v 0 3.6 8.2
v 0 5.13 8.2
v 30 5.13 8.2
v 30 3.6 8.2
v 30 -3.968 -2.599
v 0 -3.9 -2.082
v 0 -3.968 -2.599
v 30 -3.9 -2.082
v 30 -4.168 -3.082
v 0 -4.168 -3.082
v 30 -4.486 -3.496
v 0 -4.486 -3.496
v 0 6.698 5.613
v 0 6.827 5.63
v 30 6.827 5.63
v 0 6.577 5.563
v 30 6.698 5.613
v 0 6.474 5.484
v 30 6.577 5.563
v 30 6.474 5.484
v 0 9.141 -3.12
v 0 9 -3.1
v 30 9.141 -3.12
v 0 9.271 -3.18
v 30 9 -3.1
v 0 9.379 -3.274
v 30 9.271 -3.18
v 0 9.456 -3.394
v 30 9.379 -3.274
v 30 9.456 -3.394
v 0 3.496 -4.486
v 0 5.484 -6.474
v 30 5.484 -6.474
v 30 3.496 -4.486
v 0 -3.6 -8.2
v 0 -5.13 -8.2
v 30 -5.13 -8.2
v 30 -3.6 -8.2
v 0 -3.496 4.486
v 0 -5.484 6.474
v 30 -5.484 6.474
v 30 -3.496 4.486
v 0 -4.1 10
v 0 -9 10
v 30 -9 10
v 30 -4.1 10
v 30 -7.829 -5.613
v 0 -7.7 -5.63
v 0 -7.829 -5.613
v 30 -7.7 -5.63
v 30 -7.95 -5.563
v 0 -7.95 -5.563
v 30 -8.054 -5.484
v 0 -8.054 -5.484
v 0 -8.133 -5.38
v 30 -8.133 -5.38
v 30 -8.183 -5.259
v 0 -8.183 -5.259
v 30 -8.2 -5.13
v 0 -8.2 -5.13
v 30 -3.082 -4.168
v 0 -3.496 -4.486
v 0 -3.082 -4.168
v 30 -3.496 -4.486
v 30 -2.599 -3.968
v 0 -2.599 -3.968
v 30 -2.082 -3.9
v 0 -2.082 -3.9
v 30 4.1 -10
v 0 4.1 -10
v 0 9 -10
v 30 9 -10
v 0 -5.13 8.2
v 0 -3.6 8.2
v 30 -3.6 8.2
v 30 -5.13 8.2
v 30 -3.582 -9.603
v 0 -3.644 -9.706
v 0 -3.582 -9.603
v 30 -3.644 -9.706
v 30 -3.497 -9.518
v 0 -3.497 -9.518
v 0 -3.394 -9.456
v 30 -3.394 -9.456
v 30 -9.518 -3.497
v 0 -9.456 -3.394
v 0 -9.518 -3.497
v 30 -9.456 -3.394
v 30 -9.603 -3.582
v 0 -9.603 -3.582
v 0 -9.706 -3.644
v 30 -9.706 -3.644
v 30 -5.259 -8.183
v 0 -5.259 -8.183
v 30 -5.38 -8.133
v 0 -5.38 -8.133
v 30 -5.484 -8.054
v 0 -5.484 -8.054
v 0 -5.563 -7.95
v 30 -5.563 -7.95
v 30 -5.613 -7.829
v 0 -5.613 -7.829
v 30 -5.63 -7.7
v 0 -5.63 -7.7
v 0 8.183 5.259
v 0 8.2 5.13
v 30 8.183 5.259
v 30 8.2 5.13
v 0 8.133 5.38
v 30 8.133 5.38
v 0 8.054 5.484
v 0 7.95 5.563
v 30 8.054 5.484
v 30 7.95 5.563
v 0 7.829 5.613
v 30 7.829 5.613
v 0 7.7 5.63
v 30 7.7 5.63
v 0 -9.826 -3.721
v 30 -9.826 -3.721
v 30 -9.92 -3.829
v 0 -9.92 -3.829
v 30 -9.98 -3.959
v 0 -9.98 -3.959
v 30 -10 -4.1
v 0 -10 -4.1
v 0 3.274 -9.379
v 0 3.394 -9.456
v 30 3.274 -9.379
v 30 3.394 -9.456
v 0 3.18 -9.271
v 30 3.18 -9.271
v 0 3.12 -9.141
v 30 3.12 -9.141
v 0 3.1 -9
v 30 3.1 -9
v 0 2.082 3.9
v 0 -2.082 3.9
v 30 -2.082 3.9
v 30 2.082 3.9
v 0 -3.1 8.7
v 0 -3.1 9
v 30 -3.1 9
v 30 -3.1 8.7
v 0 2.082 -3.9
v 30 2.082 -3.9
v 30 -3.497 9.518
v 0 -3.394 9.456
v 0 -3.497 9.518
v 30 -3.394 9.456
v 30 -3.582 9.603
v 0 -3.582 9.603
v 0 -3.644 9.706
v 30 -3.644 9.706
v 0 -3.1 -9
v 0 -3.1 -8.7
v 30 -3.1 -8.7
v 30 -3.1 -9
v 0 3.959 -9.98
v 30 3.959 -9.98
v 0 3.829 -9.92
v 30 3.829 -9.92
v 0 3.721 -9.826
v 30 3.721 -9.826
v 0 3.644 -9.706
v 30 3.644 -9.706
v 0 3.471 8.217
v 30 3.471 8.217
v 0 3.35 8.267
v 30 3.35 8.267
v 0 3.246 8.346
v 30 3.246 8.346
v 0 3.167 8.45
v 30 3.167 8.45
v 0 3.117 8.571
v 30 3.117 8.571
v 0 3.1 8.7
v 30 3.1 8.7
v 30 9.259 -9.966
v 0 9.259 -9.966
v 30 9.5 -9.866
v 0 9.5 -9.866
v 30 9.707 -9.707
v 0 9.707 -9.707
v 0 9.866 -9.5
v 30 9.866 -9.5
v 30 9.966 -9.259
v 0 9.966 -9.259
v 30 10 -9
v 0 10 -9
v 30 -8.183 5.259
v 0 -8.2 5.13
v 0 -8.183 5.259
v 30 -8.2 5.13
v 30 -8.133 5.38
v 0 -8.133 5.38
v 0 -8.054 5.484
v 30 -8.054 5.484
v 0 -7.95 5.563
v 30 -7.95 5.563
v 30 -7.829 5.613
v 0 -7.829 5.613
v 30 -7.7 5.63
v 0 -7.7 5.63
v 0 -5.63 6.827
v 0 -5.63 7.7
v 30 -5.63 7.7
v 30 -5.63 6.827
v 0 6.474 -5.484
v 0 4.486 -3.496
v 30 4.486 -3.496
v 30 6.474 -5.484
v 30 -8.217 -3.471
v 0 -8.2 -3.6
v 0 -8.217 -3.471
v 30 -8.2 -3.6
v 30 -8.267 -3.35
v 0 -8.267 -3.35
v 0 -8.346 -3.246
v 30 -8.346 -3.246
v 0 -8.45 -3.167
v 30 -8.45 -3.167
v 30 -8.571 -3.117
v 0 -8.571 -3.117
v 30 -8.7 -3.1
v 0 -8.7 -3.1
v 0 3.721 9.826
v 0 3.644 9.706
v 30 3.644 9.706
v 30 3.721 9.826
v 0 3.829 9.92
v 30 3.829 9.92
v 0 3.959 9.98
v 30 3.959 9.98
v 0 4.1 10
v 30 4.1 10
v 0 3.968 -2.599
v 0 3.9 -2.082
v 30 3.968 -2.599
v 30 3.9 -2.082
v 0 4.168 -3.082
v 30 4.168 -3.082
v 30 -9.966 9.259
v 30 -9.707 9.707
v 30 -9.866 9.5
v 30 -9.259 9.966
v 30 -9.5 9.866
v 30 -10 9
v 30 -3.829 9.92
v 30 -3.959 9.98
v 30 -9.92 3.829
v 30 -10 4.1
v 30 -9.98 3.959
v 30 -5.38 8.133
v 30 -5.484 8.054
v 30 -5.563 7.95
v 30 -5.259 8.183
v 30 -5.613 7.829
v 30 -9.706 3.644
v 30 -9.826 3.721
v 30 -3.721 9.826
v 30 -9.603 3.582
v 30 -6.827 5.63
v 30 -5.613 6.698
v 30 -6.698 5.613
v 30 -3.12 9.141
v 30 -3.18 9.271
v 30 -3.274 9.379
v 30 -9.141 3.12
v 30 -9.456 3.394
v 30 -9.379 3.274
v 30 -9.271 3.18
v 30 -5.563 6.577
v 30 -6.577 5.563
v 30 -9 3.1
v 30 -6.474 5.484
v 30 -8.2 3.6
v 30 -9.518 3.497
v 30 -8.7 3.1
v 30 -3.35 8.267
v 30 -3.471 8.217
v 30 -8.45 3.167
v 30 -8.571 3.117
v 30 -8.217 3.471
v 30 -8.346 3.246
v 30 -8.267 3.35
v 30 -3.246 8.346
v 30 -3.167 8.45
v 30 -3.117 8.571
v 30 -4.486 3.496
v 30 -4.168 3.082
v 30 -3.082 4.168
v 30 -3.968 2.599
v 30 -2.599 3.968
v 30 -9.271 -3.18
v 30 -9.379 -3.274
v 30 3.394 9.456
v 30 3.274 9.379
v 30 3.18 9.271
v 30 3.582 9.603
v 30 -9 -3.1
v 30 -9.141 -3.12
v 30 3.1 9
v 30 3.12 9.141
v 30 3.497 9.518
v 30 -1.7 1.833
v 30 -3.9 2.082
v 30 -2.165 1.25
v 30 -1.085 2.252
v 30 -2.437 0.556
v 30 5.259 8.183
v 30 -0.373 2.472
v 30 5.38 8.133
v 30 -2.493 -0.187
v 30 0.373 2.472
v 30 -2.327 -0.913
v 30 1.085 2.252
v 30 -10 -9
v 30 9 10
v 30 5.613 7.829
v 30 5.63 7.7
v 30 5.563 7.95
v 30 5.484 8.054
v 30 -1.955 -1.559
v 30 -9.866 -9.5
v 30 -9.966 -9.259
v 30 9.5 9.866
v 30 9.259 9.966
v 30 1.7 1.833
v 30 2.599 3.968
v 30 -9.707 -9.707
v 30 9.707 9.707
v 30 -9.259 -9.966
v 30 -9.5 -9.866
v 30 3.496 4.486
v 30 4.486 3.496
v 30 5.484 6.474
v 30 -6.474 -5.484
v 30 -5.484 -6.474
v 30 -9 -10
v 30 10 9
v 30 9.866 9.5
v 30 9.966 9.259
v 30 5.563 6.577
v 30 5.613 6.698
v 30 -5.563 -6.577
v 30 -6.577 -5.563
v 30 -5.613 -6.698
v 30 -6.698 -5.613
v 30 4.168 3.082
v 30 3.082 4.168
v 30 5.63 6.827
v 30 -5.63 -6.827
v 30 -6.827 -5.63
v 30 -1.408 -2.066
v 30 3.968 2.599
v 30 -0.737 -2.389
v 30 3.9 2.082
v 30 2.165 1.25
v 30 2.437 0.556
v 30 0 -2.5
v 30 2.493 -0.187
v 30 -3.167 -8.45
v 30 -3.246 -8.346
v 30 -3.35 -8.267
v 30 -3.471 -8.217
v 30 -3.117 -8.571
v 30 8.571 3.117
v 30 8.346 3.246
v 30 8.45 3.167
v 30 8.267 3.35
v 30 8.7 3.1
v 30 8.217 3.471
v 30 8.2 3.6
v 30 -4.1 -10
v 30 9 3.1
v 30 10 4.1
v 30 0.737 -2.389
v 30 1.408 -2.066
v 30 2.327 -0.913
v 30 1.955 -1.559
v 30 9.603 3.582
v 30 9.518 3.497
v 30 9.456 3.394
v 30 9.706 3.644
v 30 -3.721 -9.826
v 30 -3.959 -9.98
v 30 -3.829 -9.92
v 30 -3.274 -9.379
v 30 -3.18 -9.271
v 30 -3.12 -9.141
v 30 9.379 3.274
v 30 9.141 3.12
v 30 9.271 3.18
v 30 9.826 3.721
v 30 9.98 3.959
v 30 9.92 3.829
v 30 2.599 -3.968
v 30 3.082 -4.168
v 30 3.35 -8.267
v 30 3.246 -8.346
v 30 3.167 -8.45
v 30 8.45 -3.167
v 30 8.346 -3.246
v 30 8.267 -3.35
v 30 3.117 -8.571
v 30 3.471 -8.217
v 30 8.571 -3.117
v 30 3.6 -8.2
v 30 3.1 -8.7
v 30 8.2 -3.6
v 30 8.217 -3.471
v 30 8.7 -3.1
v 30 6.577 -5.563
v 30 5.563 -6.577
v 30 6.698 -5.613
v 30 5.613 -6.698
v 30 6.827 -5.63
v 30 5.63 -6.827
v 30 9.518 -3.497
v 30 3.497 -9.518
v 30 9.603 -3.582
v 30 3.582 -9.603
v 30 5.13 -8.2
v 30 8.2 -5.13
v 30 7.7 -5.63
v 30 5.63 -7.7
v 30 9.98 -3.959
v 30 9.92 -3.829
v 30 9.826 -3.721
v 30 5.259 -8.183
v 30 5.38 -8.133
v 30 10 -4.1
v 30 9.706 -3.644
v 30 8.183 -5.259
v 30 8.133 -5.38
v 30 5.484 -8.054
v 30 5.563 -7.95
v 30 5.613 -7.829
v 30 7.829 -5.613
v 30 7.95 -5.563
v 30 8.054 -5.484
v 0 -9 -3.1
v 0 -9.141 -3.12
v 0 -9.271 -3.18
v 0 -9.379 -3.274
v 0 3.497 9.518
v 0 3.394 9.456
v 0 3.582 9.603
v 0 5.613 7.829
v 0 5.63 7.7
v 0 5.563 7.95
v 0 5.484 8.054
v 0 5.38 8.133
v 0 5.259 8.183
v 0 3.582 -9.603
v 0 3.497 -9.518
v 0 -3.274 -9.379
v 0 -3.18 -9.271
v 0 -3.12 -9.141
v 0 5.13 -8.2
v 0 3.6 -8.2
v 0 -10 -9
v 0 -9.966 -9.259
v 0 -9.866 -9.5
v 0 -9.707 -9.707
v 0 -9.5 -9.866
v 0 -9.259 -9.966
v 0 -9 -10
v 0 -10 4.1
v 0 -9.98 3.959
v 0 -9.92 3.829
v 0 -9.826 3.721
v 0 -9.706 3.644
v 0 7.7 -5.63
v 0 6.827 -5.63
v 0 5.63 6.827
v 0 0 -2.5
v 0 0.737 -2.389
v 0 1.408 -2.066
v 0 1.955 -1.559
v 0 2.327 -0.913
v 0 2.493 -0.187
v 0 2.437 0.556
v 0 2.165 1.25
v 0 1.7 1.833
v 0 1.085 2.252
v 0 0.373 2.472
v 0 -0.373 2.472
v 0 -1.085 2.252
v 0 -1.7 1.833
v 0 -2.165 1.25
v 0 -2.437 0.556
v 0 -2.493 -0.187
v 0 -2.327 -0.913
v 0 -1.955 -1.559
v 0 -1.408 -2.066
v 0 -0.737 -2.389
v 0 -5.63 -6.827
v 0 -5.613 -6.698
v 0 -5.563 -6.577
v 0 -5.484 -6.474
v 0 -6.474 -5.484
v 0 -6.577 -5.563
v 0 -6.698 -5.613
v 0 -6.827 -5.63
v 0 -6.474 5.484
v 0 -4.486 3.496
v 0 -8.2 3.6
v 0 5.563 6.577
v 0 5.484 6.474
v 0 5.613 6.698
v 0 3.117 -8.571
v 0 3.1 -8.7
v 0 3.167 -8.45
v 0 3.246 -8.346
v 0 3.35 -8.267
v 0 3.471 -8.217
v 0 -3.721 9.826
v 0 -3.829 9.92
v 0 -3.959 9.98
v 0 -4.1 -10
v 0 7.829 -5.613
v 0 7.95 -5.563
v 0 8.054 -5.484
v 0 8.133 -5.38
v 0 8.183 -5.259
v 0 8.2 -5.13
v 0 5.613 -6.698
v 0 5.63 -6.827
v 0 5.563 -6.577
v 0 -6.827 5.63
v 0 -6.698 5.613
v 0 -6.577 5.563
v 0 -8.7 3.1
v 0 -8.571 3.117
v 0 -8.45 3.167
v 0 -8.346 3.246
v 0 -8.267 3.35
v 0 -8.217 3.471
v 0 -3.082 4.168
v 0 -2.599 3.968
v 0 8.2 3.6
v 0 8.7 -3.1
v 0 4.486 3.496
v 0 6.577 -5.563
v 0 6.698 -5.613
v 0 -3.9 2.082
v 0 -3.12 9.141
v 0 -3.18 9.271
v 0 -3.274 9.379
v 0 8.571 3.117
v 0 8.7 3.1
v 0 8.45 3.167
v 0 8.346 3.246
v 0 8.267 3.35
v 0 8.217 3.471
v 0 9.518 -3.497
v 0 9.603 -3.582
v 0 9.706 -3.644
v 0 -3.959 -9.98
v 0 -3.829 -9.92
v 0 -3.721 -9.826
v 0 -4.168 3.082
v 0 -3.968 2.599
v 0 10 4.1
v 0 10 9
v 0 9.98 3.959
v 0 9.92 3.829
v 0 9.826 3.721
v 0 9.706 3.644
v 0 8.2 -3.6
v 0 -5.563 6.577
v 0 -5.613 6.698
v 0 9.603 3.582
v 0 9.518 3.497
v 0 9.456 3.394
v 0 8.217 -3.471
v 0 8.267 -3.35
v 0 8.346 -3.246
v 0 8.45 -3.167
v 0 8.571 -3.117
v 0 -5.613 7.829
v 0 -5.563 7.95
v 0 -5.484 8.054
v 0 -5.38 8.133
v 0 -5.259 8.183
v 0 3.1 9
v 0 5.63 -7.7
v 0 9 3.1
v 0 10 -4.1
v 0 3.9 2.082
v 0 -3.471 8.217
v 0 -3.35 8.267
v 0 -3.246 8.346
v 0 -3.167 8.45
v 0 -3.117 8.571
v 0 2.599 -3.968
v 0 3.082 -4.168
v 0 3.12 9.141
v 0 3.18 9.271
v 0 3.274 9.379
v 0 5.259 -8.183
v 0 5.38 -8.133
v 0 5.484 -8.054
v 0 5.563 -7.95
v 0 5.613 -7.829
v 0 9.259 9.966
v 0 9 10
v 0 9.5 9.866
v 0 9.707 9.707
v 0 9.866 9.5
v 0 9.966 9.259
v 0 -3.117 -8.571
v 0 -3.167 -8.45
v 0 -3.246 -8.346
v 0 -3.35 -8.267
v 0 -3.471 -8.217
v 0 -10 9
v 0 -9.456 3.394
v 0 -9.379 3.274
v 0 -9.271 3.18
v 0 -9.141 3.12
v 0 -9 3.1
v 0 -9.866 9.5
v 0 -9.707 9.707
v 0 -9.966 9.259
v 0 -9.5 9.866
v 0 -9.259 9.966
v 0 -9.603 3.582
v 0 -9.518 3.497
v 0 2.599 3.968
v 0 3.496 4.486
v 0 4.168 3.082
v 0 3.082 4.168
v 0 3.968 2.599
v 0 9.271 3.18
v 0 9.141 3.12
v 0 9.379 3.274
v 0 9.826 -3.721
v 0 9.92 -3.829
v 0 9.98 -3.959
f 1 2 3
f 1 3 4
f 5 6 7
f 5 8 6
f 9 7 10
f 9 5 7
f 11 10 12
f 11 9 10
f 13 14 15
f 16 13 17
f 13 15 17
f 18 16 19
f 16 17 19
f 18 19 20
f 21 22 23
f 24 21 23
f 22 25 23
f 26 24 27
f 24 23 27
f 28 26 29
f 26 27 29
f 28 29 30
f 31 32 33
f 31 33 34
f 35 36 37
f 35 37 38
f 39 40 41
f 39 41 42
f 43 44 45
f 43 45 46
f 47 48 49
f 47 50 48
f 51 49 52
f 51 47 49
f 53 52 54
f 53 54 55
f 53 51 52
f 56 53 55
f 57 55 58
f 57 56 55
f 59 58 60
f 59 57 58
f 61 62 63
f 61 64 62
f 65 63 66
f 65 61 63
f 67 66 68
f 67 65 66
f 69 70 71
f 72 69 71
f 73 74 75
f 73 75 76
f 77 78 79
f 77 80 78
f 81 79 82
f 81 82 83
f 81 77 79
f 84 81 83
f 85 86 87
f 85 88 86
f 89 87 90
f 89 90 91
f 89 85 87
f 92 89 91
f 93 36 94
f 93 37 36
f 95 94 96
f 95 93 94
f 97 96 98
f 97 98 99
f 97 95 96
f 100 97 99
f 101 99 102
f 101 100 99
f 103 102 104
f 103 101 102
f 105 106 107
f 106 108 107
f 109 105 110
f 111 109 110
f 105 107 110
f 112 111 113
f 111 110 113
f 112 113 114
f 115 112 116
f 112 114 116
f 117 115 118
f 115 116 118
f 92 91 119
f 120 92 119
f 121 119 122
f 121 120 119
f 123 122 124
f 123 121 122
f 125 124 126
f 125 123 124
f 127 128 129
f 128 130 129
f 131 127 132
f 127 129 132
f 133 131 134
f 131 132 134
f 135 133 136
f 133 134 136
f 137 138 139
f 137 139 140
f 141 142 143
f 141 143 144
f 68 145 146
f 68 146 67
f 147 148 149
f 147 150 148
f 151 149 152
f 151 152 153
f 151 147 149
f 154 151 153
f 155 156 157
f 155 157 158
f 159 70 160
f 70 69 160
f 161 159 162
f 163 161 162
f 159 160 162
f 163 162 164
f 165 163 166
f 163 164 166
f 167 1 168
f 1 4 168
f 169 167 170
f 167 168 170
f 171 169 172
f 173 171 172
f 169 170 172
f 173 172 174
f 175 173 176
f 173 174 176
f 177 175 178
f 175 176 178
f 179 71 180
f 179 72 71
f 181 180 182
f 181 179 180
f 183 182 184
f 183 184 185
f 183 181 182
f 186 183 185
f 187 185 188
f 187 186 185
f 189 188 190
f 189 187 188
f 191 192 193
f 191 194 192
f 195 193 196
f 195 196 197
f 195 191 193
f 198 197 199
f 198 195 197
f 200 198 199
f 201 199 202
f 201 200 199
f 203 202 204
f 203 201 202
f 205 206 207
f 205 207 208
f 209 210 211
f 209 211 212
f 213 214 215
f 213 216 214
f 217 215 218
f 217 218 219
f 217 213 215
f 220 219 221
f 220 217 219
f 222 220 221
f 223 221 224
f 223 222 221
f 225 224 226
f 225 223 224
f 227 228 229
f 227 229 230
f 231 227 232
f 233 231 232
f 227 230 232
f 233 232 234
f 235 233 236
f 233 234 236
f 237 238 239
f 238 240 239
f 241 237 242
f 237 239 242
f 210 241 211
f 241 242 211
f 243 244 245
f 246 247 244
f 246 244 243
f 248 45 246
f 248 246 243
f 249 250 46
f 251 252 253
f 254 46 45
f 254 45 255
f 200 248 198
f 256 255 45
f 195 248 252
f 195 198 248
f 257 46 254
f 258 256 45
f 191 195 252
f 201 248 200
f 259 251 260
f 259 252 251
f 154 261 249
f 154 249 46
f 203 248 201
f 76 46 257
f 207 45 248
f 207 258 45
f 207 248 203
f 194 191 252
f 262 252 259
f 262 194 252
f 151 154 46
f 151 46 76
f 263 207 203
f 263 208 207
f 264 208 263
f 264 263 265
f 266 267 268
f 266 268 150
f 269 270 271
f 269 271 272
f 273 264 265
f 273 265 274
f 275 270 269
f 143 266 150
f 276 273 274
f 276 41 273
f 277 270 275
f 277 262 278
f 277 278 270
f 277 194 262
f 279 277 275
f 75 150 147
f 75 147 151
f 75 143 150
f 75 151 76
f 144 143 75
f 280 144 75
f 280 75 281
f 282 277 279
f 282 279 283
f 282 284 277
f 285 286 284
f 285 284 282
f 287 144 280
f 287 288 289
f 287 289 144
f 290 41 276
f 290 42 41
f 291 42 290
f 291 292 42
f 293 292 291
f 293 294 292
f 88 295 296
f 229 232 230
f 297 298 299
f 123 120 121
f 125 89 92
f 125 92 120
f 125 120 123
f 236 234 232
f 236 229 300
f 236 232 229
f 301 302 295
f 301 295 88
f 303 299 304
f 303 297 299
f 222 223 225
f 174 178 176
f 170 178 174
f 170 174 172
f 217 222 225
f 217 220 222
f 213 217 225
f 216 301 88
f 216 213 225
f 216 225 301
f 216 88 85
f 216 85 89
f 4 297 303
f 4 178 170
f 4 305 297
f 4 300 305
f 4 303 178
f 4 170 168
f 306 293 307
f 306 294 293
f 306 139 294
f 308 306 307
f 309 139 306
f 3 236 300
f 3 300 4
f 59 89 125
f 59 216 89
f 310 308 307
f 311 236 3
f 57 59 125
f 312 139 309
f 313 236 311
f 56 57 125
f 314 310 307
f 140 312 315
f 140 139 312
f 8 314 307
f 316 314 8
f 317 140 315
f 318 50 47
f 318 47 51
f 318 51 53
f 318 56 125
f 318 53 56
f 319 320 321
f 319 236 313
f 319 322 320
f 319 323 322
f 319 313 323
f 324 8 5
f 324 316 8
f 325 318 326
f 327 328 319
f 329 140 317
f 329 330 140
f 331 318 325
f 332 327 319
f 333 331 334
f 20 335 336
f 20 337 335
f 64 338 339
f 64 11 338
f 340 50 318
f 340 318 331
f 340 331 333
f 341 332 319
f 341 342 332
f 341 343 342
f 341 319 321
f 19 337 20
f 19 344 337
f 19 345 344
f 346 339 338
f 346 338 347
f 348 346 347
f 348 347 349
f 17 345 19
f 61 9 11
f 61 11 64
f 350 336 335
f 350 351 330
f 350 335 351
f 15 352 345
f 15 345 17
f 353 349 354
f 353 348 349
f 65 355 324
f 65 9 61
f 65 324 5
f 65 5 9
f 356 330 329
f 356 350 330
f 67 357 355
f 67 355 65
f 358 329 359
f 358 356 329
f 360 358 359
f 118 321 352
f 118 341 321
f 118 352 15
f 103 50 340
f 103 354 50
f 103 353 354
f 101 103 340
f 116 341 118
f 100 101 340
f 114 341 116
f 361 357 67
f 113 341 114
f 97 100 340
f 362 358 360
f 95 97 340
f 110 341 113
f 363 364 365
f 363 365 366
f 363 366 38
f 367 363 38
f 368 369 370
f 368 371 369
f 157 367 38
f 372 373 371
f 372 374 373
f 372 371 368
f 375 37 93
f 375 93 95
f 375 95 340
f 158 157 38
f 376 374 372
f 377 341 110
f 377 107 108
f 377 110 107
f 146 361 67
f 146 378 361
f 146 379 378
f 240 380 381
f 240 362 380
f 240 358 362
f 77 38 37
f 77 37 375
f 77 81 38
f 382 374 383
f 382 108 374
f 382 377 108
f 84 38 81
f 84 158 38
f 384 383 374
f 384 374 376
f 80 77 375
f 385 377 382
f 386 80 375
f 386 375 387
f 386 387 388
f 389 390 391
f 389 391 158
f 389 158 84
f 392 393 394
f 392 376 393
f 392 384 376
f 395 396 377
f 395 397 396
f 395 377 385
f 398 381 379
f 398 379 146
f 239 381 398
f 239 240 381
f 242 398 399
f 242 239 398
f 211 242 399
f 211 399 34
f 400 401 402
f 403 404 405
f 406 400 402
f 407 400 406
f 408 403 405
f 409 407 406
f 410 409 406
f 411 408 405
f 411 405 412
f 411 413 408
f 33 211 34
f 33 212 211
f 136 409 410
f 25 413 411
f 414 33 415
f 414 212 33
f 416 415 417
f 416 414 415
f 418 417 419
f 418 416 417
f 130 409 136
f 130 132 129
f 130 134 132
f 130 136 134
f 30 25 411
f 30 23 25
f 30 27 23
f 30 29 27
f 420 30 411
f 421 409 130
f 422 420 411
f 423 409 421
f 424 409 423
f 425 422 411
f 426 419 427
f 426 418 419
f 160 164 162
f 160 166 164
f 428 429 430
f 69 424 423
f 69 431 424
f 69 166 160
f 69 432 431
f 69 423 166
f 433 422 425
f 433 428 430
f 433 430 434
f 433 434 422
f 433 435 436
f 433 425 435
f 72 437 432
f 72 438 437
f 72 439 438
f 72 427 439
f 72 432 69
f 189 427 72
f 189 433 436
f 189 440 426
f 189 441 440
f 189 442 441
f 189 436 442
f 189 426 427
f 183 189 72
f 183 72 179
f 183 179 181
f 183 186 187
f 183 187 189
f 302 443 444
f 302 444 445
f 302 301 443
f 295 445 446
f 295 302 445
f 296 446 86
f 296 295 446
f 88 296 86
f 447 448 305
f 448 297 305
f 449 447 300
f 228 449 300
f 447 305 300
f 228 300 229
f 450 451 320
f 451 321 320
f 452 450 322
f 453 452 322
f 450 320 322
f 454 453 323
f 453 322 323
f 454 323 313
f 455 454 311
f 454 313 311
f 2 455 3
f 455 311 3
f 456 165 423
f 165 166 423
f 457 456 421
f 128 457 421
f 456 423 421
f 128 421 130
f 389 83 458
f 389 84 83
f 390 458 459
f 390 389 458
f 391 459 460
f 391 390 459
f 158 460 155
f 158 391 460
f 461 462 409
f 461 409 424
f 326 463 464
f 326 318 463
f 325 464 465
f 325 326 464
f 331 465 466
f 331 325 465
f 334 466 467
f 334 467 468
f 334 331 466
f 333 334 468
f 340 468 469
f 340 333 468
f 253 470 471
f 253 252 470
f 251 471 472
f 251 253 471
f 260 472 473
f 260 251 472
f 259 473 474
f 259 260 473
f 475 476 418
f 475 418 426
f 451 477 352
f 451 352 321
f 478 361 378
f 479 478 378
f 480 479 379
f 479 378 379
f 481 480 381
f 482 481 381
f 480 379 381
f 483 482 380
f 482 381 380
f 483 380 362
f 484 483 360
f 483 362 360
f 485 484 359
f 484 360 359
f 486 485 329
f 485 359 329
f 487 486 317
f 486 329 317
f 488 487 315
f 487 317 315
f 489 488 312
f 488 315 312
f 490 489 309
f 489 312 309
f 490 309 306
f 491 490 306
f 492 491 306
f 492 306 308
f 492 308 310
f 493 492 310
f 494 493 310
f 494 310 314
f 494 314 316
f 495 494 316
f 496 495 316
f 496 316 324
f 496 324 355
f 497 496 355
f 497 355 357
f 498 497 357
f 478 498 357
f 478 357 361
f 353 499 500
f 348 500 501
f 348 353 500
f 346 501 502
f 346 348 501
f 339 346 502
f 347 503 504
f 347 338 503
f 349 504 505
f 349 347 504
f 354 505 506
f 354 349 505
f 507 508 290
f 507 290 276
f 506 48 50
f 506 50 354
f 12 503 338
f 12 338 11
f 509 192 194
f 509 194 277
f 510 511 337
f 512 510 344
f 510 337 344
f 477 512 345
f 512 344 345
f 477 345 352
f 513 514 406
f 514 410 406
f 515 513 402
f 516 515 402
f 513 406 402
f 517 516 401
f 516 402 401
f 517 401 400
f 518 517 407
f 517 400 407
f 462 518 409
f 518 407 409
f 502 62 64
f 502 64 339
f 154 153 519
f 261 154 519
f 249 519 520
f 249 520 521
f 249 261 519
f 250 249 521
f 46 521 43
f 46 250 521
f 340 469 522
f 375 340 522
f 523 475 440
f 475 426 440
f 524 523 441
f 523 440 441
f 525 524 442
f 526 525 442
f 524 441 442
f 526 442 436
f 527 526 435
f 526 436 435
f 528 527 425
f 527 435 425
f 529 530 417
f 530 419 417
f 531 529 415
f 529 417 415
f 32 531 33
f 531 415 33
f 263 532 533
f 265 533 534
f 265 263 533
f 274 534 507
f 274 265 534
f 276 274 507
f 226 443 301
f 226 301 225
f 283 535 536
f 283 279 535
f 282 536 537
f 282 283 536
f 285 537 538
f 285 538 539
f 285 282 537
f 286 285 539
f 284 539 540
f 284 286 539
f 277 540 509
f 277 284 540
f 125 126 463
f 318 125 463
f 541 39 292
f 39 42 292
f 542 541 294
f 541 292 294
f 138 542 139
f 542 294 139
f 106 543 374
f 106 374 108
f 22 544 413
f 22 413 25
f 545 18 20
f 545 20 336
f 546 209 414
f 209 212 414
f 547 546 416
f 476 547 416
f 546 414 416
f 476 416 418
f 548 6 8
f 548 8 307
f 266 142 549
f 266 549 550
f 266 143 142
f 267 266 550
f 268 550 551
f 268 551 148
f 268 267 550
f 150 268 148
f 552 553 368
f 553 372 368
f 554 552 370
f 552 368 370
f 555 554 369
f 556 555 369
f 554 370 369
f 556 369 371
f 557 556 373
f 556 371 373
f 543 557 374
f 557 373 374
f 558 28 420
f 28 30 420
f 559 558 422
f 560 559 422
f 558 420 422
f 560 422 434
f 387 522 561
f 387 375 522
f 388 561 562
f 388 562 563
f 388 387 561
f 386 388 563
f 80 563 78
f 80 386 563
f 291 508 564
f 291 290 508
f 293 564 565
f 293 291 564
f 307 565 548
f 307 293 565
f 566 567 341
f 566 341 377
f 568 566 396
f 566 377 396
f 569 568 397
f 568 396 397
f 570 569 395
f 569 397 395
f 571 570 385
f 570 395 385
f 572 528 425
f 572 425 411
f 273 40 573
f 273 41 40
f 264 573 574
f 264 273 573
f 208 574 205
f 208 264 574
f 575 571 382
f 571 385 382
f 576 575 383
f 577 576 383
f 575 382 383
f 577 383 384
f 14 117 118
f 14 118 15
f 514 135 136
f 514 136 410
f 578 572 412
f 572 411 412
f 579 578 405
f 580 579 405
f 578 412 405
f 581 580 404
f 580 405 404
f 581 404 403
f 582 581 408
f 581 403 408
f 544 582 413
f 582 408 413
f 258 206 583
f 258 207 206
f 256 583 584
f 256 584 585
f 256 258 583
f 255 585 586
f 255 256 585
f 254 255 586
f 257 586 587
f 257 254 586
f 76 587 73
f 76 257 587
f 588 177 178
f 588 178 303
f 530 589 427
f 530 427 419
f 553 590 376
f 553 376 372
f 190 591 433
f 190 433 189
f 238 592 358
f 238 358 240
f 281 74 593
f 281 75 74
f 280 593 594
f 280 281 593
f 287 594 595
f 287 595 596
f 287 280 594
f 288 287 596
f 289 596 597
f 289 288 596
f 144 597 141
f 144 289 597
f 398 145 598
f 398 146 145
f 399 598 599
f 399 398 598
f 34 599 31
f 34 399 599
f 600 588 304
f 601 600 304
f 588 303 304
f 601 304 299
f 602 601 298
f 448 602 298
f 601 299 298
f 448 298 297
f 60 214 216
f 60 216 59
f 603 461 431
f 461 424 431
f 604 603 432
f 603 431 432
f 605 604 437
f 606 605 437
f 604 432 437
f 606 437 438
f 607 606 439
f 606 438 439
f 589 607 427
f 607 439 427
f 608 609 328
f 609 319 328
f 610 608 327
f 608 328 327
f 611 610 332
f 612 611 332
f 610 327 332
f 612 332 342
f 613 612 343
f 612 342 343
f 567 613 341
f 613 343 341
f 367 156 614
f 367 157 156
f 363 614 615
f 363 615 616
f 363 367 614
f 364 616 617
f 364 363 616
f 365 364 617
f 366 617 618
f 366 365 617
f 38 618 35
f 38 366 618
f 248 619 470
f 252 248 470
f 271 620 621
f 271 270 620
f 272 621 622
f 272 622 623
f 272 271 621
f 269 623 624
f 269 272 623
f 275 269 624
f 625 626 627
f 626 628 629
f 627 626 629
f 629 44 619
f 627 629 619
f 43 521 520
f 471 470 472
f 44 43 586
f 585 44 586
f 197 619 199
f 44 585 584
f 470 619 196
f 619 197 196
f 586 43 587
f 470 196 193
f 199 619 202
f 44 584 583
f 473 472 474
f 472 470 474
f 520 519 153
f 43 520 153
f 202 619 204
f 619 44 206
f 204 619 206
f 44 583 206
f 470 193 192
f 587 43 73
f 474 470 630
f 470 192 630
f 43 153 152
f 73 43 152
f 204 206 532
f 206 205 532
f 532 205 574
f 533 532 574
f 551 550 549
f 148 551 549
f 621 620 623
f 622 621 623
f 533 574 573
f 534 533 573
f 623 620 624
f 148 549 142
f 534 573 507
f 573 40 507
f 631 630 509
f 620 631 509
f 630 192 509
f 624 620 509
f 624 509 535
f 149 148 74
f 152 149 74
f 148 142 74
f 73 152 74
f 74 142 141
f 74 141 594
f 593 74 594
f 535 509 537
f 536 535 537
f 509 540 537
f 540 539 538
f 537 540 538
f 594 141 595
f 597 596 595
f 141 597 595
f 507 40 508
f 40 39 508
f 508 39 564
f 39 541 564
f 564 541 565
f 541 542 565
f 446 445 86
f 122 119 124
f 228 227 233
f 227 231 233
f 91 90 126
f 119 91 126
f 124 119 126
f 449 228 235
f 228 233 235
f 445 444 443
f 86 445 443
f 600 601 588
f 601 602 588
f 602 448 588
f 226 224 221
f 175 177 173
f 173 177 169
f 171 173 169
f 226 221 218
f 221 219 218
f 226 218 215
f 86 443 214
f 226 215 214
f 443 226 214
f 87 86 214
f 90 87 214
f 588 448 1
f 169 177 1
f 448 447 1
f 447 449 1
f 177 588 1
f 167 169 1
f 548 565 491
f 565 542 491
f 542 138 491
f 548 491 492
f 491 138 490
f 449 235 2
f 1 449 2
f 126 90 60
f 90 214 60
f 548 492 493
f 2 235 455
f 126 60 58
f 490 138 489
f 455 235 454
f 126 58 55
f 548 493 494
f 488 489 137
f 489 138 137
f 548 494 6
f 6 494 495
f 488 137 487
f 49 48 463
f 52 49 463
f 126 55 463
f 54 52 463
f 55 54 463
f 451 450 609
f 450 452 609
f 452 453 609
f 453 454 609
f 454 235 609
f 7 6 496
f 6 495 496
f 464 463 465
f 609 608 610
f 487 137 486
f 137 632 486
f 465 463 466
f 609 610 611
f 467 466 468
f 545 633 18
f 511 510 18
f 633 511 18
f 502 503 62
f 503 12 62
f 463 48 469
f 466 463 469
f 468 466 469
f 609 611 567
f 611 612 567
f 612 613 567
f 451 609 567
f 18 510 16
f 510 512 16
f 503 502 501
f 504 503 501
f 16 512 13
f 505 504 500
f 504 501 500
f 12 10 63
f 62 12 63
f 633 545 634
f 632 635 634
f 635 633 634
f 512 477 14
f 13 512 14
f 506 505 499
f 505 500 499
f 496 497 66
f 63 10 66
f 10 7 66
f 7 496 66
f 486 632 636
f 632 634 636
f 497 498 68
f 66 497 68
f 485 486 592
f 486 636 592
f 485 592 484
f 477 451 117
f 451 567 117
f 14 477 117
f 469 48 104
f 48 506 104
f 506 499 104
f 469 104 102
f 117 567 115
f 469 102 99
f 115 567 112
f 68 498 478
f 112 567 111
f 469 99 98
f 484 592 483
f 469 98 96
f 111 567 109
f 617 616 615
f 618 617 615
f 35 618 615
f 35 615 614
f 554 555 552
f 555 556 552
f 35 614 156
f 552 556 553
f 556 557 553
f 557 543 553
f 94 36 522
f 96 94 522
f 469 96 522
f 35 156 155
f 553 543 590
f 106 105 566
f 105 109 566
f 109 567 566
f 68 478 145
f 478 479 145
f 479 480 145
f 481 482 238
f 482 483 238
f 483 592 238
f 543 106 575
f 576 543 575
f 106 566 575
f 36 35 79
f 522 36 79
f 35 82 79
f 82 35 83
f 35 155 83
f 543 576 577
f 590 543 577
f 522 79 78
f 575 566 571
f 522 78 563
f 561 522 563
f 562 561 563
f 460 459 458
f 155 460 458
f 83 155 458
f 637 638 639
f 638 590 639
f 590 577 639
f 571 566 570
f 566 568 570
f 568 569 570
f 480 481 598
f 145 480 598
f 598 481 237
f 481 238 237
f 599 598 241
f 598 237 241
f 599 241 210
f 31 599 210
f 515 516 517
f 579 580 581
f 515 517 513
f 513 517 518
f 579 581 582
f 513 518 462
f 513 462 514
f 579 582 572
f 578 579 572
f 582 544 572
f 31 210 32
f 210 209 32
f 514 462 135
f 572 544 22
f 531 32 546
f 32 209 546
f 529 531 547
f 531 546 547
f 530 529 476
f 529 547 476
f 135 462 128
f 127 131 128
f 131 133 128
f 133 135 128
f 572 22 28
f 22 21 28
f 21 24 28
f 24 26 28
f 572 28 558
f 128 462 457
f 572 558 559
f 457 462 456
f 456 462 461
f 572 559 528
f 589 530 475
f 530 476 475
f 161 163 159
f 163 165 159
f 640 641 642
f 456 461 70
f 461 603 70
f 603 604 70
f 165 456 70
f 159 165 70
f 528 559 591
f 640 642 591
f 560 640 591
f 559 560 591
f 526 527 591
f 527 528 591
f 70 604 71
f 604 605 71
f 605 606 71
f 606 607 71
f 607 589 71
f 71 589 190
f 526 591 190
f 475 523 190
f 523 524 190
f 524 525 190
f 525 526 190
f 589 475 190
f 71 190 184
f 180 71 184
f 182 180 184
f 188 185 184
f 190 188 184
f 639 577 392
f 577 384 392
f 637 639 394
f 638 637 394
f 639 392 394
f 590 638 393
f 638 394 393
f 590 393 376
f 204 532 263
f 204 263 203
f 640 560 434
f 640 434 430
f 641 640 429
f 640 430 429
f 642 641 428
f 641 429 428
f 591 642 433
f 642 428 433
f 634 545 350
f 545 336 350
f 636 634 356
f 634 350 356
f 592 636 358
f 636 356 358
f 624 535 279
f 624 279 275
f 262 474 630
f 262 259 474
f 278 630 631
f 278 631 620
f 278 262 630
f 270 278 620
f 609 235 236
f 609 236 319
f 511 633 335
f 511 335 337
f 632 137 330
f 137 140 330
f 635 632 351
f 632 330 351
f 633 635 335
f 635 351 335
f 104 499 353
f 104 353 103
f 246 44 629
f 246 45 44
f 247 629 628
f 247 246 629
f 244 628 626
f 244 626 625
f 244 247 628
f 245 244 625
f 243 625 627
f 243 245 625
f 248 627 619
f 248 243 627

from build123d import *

# Parameters (mm, degrees)
SKETCH1_W                = 20
SKETCH1_H                = 20
BOSS_EXTRUDE1_DEPTH      = 30
FILLET1_R                = 1
CUT_EXTRUDE1_DEPTH       = 34.166247904
F_5_0_5_DIAMETER_HOLE1_D = 5
FILLET2_R                = 2
FILLET3_R                = 0.5
FILLET4_R                = 0.5
FILLET5_R                = 0.5


with BuildPart() as part:
    # Sketch1 → Boss-Extrude1 (new body)
    with BuildSketch(Plane(origin=(0, 0, 0), x_dir=(0, 0, -1), z_dir=(1, 0, 0))):
        Rectangle(SKETCH1_W, SKETCH1_H)
    extrude(amount=BOSS_EXTRUDE1_DEPTH)

    # Fillet1
    fillet1_edges = [part.edges().sort_by_distance(p)[0] for p in [
        (15, 10, 10),
        (15, 10, -10),
        (15, -10, -10),
        (15, -10, 10),
    ]]
    fillet(fillet1_edges, radius=FILLET1_R)

    # Sketch3 → Cut-Extrude1 (cut, through all)
    with BuildSketch(Plane.ZY):
        Polygon((-3.6, 10), (3.6, 10), (3.6, 9.5), (3.1, 9.5), (3.1, 8.2), (5.63, 8.2), (5.63, 6.619949494), (2.910050506, 3.9), (-2.910050506, 3.9), (-5.63, 6.619949494), (-5.63, 8.2), (-3.1, 8.2), (-3.1, 9.5), (-3.6, 9.5), align=None)
        Polygon((10, 3.6), (10, -3.6), (9.5, -3.6), (9.5, -3.1), (8.2, -3.1), (8.2, -5.63), (6.619949494, -5.63), (3.9, -2.910050506), (3.9, 2.910050506), (6.619949494, 5.63), (8.2, 5.63), (8.2, 3.1), (9.5, 3.1), (9.5, 3.6), align=None)
        Polygon((3.6, -10), (-3.6, -10), (-3.6, -9.5), (-3.1, -9.5), (-3.1, -8.2), (-5.63, -8.2), (-5.63, -6.619949494), (-2.910050506, -3.9), (2.910050506, -3.9), (5.63, -6.619949494), (5.63, -8.2), (3.1, -8.2), (3.1, -9.5), (3.6, -9.5), align=None)
        Polygon((-10, -3.6), (-10, 3.6), (-9.5, 3.6), (-9.5, 3.1), (-8.2, 3.1), (-8.2, 5.63), (-6.619949494, 5.63), (-3.9, 2.910050506), (-3.9, -2.910050506), (-6.619949494, -5.63), (-8.2, -5.63), (-8.2, -3.1), (-9.5, -3.1), (-9.5, -3.6), align=None)
    extrude(amount=-CUT_EXTRUDE1_DEPTH, mode=Mode.SUBTRACT)

    # Ø5.0 (5) Diameter Hole1 (through all)
    with Locations(Plane.ZY):
        with Locations((0, 0)):
            Hole(F_5_0_5_DIAMETER_HOLE1_D / 2)

    # Fillet2
    fillet2_edges = [part.edges().sort_by_distance(p)[0] for p in [
        (15, -3.9, -2.910050506),
        (15, -3.9, 2.910050506),
        (15, 2.910050506, -3.9),
        (15, -2.910050506, -3.9),
        (15, -2.910050506, 3.9),
        (15, 2.910050506, 3.9),
        (15, 3.9, 2.910050506),
        (15, 3.9, -2.910050506),
    ]]
    fillet(fillet2_edges, radius=FILLET2_R)

    # Fillet3
    fillet3_edges = [part.edges().sort_by_distance(p)[0] for p in [
        (15, 3.6, -10),
        (15, 3.1, -9.5),
        (15, 3.1, -8.2),
        (15, 5.63, -8.2),
        (15, 5.63, -6.619949494),
        (15, 3.6, 10),
        (15, 3.1, 9.5),
        (15, 3.1, 8.2),
        (15, 5.63, 8.2),
        (15, 5.63, 6.619949494),
        (15, 6.619949494, 5.63),
        (15, 8.2, 5.63),
        (15, 8.2, 3.1),
        (15, 9.5, 3.1),
        (15, 10, 3.6),
        (15, 9.5, -3.1),
        (15, 10, -3.6),
        (15, 8.2, -3.1),
        (15, 8.2, -5.63),
        (15, 6.619949494, -5.63),
    ]]
    fillet(fillet3_edges, radius=FILLET3_R - 0.0001)  # a hair under: the kernel refuses the full size

    # Fillet4
    fillet4_edges = [part.edges().sort_by_distance(p)[0] for p in [
        (15, -3.6, 10),
        (15, -3.1, 9.5),
        (15, -3.1, 8.2),
        (15, -5.63, 8.2),
        (15, -5.63, 6.619949494),
        (15, -6.619949494, 5.63),
        (15, -8.2, 5.63),
        (15, -8.2, 3.1),
        (15, -10, 3.6),
        (15, -9.5, 3.1),
        (15, -10, -3.6),
        (15, -9.5, -3.1),
        (15, -8.2, -3.1),
        (15, -8.2, -5.63),
        (15, -6.619949494, -5.63),
        (15, -5.63, -6.619949494),
        (15, -5.63, -8.2),
        (15, -3.1, -8.2),
        (15, -3.1, -9.5),
        (15, -3.6, -10),
    ]]
    fillet(fillet4_edges, radius=FILLET4_R - 0.0001)  # a hair under: the kernel refuses the full size

    # Fillet5
    fillet5_edges = [part.edges().sort_by_distance(p)[0] for p in [
        (15, 3.6, 9.5),
        (15, 9.5, 3.6),
        (15, 9.5, -3.6),
        (15, 3.6, -9.5),
        (15, -3.6, 9.5),
        (15, -9.5, 3.6),
        (15, -9.5, -3.6),
        (15, -3.6, -9.5),
    ]]
    fillet(fillet5_edges, radius=FILLET5_R)


solid = part.part
